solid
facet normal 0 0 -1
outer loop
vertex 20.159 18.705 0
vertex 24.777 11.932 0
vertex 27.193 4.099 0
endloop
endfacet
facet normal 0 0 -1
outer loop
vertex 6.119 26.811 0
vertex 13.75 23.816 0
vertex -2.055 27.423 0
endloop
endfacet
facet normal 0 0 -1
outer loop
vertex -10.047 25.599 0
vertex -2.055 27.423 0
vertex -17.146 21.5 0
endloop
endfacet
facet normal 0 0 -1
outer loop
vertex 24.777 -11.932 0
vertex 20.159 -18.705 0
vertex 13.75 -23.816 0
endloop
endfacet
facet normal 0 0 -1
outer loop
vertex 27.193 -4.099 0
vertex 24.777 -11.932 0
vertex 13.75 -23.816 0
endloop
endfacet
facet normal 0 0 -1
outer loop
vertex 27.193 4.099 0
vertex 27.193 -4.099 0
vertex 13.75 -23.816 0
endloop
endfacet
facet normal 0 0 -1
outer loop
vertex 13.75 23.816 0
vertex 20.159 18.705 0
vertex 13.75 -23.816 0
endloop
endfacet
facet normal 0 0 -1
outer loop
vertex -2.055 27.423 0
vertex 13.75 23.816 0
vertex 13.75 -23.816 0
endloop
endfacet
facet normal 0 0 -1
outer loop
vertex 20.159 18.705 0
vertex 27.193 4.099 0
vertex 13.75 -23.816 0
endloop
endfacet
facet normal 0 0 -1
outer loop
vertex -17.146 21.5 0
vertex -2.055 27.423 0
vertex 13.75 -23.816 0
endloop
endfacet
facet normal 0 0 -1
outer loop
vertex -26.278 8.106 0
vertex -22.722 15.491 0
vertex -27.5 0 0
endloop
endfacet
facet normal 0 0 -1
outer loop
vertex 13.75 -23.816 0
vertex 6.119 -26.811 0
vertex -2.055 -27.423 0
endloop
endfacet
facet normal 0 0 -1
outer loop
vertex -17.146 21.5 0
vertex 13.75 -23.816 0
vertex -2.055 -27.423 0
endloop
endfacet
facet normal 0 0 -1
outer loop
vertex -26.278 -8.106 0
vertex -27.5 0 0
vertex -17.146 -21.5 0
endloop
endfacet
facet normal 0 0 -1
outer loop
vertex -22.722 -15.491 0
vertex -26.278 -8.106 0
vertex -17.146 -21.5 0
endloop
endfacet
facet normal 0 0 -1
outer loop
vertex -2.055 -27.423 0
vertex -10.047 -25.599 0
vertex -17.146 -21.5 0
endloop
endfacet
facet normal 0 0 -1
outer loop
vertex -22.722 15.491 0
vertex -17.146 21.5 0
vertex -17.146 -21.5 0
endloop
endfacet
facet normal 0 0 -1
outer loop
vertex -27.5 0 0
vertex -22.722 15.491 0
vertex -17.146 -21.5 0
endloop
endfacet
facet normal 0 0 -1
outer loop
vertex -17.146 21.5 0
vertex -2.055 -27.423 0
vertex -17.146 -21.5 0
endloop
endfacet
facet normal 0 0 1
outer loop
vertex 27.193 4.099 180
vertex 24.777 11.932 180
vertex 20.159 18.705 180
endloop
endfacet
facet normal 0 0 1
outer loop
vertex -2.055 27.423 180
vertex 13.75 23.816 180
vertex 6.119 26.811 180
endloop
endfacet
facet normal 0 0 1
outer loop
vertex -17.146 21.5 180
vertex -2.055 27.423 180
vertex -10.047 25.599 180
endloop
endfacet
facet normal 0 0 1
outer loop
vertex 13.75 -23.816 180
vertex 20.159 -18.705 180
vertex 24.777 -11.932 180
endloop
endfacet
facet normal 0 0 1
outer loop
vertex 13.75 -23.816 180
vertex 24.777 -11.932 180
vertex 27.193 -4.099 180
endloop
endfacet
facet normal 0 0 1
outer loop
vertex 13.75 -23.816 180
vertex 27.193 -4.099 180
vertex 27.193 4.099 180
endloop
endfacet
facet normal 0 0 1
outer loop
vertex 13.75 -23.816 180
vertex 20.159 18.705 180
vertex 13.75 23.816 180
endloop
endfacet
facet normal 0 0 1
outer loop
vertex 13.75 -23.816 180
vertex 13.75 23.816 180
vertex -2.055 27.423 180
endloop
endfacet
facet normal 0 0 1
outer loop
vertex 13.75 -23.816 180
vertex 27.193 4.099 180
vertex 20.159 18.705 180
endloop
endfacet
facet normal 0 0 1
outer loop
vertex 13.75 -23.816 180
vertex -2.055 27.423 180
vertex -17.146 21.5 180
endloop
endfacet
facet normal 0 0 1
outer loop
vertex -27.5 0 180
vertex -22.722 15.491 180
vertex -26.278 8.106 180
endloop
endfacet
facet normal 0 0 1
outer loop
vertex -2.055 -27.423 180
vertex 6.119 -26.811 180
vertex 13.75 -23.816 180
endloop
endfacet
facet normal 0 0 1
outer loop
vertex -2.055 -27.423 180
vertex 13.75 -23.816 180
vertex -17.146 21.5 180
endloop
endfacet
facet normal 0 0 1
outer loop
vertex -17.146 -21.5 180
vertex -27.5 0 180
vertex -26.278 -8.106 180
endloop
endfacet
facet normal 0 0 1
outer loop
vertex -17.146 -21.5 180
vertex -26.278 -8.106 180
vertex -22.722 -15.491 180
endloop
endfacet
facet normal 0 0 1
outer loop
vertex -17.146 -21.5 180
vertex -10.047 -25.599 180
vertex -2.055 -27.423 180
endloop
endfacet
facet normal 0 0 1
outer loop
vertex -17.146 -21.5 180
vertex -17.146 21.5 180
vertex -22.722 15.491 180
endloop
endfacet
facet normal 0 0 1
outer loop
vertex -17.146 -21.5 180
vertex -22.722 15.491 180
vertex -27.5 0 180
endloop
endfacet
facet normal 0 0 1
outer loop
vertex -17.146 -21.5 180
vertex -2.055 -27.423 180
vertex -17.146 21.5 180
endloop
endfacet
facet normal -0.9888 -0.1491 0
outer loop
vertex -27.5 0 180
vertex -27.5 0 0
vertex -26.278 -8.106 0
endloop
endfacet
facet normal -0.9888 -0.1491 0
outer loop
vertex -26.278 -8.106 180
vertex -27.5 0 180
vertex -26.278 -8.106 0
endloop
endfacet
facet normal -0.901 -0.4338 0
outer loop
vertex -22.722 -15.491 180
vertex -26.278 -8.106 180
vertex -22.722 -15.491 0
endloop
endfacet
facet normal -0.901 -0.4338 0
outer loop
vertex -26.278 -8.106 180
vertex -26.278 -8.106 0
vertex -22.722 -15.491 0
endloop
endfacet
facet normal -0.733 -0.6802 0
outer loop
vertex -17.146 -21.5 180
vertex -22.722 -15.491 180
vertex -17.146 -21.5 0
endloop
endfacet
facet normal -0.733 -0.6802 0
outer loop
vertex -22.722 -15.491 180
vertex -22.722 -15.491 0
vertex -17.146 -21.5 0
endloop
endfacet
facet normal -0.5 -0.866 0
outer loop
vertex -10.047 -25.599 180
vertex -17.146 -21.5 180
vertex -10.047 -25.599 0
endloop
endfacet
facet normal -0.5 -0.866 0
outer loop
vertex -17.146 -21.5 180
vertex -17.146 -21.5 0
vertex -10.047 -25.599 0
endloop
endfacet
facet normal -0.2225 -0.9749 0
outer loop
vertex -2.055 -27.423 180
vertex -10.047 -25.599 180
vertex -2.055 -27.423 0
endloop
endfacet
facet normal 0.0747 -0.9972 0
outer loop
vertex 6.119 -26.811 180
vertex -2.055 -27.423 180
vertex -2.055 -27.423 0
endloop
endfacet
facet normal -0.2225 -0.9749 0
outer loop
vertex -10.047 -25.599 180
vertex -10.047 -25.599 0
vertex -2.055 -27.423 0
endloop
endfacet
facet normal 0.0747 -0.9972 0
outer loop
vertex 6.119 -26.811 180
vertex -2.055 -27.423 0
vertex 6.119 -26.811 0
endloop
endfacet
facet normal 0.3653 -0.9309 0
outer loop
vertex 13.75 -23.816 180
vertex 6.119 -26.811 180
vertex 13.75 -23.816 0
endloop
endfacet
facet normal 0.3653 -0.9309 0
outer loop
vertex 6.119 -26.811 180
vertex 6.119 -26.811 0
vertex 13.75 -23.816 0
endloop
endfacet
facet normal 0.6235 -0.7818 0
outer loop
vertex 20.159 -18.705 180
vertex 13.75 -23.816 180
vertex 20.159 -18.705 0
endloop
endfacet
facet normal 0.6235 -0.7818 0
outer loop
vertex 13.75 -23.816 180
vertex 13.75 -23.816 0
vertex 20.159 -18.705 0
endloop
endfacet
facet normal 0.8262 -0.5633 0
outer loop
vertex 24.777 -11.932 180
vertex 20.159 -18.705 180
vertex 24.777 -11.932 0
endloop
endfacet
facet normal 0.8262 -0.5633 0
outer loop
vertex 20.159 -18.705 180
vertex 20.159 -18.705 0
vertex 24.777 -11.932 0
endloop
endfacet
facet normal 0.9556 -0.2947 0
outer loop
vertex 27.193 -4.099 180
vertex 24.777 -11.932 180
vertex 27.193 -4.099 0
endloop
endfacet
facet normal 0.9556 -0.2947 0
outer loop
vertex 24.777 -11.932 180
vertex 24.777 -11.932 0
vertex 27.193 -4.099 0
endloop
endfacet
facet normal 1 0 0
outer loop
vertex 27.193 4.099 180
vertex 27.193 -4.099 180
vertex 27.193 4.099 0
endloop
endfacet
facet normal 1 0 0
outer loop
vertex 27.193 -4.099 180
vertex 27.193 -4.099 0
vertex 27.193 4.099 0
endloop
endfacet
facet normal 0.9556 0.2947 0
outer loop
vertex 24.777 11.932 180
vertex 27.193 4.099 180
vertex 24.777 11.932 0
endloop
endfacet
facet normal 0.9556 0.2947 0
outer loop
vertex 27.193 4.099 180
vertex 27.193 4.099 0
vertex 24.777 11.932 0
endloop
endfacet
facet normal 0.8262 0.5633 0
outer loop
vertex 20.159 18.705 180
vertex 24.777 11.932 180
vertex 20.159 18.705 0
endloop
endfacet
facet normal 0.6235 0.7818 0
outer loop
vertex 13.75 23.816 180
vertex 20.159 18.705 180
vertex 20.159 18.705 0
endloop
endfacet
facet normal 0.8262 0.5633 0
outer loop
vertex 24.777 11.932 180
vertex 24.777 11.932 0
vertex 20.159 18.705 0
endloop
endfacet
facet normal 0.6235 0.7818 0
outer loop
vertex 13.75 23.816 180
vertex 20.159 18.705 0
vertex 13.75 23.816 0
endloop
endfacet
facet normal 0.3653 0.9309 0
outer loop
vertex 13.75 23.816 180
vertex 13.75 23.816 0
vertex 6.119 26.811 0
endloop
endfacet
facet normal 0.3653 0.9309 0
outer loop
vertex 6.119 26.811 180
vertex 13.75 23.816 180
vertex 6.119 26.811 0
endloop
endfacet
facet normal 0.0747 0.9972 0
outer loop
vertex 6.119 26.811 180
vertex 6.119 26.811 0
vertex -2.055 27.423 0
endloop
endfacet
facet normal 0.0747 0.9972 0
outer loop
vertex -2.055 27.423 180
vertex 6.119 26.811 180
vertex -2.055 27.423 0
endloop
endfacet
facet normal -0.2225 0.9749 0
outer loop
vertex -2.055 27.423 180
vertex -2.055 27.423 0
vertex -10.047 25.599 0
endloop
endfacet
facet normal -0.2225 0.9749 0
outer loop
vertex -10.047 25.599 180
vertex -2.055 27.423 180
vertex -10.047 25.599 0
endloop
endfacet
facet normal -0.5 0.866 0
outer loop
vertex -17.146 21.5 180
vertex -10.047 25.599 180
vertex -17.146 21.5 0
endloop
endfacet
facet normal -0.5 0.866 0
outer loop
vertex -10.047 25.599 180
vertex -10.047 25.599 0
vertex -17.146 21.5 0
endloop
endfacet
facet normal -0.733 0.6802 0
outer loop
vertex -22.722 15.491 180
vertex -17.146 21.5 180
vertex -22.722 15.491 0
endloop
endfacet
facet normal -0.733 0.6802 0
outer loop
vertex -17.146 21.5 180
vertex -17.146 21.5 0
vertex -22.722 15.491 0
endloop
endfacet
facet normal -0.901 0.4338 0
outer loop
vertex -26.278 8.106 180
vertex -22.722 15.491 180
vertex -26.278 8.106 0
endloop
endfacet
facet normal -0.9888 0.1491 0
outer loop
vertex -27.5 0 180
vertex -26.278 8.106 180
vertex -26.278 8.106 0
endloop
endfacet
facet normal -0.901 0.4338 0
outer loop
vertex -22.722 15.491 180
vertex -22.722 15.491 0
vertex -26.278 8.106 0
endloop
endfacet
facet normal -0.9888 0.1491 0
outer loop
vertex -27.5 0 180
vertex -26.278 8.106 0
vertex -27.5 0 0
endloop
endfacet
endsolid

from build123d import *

# Parameters (mm, degrees)
SKETCH1_R           = 27.5
BOSS_EXTRUDE1_DEPTH = 180
SKETCH2_R           = 27.5
BOSS_EXTRUDE2_DEPTH = 180
SKETCH3_R           = 27.5
BOSS_EXTRUDE3_DEPTH = 180


with BuildPart() as part:
    # Sketch1 → Boss-Extrude1 (new body)
    with BuildSketch(Plane.XY):
        Circle(SKETCH1_R)
    extrude(amount=BOSS_EXTRUDE1_DEPTH)

    # Sketch2 → Boss-Extrude2 (add)
    with BuildSketch(Plane.XY):
        Circle(SKETCH2_R)
    extrude(amount=BOSS_EXTRUDE2_DEPTH)

    # Sketch3 → Boss-Extrude3 (add)
    with BuildSketch(Plane.XY):
        Circle(SKETCH3_R)
    extrude(amount=BOSS_EXTRUDE3_DEPTH)


solid = part.part
